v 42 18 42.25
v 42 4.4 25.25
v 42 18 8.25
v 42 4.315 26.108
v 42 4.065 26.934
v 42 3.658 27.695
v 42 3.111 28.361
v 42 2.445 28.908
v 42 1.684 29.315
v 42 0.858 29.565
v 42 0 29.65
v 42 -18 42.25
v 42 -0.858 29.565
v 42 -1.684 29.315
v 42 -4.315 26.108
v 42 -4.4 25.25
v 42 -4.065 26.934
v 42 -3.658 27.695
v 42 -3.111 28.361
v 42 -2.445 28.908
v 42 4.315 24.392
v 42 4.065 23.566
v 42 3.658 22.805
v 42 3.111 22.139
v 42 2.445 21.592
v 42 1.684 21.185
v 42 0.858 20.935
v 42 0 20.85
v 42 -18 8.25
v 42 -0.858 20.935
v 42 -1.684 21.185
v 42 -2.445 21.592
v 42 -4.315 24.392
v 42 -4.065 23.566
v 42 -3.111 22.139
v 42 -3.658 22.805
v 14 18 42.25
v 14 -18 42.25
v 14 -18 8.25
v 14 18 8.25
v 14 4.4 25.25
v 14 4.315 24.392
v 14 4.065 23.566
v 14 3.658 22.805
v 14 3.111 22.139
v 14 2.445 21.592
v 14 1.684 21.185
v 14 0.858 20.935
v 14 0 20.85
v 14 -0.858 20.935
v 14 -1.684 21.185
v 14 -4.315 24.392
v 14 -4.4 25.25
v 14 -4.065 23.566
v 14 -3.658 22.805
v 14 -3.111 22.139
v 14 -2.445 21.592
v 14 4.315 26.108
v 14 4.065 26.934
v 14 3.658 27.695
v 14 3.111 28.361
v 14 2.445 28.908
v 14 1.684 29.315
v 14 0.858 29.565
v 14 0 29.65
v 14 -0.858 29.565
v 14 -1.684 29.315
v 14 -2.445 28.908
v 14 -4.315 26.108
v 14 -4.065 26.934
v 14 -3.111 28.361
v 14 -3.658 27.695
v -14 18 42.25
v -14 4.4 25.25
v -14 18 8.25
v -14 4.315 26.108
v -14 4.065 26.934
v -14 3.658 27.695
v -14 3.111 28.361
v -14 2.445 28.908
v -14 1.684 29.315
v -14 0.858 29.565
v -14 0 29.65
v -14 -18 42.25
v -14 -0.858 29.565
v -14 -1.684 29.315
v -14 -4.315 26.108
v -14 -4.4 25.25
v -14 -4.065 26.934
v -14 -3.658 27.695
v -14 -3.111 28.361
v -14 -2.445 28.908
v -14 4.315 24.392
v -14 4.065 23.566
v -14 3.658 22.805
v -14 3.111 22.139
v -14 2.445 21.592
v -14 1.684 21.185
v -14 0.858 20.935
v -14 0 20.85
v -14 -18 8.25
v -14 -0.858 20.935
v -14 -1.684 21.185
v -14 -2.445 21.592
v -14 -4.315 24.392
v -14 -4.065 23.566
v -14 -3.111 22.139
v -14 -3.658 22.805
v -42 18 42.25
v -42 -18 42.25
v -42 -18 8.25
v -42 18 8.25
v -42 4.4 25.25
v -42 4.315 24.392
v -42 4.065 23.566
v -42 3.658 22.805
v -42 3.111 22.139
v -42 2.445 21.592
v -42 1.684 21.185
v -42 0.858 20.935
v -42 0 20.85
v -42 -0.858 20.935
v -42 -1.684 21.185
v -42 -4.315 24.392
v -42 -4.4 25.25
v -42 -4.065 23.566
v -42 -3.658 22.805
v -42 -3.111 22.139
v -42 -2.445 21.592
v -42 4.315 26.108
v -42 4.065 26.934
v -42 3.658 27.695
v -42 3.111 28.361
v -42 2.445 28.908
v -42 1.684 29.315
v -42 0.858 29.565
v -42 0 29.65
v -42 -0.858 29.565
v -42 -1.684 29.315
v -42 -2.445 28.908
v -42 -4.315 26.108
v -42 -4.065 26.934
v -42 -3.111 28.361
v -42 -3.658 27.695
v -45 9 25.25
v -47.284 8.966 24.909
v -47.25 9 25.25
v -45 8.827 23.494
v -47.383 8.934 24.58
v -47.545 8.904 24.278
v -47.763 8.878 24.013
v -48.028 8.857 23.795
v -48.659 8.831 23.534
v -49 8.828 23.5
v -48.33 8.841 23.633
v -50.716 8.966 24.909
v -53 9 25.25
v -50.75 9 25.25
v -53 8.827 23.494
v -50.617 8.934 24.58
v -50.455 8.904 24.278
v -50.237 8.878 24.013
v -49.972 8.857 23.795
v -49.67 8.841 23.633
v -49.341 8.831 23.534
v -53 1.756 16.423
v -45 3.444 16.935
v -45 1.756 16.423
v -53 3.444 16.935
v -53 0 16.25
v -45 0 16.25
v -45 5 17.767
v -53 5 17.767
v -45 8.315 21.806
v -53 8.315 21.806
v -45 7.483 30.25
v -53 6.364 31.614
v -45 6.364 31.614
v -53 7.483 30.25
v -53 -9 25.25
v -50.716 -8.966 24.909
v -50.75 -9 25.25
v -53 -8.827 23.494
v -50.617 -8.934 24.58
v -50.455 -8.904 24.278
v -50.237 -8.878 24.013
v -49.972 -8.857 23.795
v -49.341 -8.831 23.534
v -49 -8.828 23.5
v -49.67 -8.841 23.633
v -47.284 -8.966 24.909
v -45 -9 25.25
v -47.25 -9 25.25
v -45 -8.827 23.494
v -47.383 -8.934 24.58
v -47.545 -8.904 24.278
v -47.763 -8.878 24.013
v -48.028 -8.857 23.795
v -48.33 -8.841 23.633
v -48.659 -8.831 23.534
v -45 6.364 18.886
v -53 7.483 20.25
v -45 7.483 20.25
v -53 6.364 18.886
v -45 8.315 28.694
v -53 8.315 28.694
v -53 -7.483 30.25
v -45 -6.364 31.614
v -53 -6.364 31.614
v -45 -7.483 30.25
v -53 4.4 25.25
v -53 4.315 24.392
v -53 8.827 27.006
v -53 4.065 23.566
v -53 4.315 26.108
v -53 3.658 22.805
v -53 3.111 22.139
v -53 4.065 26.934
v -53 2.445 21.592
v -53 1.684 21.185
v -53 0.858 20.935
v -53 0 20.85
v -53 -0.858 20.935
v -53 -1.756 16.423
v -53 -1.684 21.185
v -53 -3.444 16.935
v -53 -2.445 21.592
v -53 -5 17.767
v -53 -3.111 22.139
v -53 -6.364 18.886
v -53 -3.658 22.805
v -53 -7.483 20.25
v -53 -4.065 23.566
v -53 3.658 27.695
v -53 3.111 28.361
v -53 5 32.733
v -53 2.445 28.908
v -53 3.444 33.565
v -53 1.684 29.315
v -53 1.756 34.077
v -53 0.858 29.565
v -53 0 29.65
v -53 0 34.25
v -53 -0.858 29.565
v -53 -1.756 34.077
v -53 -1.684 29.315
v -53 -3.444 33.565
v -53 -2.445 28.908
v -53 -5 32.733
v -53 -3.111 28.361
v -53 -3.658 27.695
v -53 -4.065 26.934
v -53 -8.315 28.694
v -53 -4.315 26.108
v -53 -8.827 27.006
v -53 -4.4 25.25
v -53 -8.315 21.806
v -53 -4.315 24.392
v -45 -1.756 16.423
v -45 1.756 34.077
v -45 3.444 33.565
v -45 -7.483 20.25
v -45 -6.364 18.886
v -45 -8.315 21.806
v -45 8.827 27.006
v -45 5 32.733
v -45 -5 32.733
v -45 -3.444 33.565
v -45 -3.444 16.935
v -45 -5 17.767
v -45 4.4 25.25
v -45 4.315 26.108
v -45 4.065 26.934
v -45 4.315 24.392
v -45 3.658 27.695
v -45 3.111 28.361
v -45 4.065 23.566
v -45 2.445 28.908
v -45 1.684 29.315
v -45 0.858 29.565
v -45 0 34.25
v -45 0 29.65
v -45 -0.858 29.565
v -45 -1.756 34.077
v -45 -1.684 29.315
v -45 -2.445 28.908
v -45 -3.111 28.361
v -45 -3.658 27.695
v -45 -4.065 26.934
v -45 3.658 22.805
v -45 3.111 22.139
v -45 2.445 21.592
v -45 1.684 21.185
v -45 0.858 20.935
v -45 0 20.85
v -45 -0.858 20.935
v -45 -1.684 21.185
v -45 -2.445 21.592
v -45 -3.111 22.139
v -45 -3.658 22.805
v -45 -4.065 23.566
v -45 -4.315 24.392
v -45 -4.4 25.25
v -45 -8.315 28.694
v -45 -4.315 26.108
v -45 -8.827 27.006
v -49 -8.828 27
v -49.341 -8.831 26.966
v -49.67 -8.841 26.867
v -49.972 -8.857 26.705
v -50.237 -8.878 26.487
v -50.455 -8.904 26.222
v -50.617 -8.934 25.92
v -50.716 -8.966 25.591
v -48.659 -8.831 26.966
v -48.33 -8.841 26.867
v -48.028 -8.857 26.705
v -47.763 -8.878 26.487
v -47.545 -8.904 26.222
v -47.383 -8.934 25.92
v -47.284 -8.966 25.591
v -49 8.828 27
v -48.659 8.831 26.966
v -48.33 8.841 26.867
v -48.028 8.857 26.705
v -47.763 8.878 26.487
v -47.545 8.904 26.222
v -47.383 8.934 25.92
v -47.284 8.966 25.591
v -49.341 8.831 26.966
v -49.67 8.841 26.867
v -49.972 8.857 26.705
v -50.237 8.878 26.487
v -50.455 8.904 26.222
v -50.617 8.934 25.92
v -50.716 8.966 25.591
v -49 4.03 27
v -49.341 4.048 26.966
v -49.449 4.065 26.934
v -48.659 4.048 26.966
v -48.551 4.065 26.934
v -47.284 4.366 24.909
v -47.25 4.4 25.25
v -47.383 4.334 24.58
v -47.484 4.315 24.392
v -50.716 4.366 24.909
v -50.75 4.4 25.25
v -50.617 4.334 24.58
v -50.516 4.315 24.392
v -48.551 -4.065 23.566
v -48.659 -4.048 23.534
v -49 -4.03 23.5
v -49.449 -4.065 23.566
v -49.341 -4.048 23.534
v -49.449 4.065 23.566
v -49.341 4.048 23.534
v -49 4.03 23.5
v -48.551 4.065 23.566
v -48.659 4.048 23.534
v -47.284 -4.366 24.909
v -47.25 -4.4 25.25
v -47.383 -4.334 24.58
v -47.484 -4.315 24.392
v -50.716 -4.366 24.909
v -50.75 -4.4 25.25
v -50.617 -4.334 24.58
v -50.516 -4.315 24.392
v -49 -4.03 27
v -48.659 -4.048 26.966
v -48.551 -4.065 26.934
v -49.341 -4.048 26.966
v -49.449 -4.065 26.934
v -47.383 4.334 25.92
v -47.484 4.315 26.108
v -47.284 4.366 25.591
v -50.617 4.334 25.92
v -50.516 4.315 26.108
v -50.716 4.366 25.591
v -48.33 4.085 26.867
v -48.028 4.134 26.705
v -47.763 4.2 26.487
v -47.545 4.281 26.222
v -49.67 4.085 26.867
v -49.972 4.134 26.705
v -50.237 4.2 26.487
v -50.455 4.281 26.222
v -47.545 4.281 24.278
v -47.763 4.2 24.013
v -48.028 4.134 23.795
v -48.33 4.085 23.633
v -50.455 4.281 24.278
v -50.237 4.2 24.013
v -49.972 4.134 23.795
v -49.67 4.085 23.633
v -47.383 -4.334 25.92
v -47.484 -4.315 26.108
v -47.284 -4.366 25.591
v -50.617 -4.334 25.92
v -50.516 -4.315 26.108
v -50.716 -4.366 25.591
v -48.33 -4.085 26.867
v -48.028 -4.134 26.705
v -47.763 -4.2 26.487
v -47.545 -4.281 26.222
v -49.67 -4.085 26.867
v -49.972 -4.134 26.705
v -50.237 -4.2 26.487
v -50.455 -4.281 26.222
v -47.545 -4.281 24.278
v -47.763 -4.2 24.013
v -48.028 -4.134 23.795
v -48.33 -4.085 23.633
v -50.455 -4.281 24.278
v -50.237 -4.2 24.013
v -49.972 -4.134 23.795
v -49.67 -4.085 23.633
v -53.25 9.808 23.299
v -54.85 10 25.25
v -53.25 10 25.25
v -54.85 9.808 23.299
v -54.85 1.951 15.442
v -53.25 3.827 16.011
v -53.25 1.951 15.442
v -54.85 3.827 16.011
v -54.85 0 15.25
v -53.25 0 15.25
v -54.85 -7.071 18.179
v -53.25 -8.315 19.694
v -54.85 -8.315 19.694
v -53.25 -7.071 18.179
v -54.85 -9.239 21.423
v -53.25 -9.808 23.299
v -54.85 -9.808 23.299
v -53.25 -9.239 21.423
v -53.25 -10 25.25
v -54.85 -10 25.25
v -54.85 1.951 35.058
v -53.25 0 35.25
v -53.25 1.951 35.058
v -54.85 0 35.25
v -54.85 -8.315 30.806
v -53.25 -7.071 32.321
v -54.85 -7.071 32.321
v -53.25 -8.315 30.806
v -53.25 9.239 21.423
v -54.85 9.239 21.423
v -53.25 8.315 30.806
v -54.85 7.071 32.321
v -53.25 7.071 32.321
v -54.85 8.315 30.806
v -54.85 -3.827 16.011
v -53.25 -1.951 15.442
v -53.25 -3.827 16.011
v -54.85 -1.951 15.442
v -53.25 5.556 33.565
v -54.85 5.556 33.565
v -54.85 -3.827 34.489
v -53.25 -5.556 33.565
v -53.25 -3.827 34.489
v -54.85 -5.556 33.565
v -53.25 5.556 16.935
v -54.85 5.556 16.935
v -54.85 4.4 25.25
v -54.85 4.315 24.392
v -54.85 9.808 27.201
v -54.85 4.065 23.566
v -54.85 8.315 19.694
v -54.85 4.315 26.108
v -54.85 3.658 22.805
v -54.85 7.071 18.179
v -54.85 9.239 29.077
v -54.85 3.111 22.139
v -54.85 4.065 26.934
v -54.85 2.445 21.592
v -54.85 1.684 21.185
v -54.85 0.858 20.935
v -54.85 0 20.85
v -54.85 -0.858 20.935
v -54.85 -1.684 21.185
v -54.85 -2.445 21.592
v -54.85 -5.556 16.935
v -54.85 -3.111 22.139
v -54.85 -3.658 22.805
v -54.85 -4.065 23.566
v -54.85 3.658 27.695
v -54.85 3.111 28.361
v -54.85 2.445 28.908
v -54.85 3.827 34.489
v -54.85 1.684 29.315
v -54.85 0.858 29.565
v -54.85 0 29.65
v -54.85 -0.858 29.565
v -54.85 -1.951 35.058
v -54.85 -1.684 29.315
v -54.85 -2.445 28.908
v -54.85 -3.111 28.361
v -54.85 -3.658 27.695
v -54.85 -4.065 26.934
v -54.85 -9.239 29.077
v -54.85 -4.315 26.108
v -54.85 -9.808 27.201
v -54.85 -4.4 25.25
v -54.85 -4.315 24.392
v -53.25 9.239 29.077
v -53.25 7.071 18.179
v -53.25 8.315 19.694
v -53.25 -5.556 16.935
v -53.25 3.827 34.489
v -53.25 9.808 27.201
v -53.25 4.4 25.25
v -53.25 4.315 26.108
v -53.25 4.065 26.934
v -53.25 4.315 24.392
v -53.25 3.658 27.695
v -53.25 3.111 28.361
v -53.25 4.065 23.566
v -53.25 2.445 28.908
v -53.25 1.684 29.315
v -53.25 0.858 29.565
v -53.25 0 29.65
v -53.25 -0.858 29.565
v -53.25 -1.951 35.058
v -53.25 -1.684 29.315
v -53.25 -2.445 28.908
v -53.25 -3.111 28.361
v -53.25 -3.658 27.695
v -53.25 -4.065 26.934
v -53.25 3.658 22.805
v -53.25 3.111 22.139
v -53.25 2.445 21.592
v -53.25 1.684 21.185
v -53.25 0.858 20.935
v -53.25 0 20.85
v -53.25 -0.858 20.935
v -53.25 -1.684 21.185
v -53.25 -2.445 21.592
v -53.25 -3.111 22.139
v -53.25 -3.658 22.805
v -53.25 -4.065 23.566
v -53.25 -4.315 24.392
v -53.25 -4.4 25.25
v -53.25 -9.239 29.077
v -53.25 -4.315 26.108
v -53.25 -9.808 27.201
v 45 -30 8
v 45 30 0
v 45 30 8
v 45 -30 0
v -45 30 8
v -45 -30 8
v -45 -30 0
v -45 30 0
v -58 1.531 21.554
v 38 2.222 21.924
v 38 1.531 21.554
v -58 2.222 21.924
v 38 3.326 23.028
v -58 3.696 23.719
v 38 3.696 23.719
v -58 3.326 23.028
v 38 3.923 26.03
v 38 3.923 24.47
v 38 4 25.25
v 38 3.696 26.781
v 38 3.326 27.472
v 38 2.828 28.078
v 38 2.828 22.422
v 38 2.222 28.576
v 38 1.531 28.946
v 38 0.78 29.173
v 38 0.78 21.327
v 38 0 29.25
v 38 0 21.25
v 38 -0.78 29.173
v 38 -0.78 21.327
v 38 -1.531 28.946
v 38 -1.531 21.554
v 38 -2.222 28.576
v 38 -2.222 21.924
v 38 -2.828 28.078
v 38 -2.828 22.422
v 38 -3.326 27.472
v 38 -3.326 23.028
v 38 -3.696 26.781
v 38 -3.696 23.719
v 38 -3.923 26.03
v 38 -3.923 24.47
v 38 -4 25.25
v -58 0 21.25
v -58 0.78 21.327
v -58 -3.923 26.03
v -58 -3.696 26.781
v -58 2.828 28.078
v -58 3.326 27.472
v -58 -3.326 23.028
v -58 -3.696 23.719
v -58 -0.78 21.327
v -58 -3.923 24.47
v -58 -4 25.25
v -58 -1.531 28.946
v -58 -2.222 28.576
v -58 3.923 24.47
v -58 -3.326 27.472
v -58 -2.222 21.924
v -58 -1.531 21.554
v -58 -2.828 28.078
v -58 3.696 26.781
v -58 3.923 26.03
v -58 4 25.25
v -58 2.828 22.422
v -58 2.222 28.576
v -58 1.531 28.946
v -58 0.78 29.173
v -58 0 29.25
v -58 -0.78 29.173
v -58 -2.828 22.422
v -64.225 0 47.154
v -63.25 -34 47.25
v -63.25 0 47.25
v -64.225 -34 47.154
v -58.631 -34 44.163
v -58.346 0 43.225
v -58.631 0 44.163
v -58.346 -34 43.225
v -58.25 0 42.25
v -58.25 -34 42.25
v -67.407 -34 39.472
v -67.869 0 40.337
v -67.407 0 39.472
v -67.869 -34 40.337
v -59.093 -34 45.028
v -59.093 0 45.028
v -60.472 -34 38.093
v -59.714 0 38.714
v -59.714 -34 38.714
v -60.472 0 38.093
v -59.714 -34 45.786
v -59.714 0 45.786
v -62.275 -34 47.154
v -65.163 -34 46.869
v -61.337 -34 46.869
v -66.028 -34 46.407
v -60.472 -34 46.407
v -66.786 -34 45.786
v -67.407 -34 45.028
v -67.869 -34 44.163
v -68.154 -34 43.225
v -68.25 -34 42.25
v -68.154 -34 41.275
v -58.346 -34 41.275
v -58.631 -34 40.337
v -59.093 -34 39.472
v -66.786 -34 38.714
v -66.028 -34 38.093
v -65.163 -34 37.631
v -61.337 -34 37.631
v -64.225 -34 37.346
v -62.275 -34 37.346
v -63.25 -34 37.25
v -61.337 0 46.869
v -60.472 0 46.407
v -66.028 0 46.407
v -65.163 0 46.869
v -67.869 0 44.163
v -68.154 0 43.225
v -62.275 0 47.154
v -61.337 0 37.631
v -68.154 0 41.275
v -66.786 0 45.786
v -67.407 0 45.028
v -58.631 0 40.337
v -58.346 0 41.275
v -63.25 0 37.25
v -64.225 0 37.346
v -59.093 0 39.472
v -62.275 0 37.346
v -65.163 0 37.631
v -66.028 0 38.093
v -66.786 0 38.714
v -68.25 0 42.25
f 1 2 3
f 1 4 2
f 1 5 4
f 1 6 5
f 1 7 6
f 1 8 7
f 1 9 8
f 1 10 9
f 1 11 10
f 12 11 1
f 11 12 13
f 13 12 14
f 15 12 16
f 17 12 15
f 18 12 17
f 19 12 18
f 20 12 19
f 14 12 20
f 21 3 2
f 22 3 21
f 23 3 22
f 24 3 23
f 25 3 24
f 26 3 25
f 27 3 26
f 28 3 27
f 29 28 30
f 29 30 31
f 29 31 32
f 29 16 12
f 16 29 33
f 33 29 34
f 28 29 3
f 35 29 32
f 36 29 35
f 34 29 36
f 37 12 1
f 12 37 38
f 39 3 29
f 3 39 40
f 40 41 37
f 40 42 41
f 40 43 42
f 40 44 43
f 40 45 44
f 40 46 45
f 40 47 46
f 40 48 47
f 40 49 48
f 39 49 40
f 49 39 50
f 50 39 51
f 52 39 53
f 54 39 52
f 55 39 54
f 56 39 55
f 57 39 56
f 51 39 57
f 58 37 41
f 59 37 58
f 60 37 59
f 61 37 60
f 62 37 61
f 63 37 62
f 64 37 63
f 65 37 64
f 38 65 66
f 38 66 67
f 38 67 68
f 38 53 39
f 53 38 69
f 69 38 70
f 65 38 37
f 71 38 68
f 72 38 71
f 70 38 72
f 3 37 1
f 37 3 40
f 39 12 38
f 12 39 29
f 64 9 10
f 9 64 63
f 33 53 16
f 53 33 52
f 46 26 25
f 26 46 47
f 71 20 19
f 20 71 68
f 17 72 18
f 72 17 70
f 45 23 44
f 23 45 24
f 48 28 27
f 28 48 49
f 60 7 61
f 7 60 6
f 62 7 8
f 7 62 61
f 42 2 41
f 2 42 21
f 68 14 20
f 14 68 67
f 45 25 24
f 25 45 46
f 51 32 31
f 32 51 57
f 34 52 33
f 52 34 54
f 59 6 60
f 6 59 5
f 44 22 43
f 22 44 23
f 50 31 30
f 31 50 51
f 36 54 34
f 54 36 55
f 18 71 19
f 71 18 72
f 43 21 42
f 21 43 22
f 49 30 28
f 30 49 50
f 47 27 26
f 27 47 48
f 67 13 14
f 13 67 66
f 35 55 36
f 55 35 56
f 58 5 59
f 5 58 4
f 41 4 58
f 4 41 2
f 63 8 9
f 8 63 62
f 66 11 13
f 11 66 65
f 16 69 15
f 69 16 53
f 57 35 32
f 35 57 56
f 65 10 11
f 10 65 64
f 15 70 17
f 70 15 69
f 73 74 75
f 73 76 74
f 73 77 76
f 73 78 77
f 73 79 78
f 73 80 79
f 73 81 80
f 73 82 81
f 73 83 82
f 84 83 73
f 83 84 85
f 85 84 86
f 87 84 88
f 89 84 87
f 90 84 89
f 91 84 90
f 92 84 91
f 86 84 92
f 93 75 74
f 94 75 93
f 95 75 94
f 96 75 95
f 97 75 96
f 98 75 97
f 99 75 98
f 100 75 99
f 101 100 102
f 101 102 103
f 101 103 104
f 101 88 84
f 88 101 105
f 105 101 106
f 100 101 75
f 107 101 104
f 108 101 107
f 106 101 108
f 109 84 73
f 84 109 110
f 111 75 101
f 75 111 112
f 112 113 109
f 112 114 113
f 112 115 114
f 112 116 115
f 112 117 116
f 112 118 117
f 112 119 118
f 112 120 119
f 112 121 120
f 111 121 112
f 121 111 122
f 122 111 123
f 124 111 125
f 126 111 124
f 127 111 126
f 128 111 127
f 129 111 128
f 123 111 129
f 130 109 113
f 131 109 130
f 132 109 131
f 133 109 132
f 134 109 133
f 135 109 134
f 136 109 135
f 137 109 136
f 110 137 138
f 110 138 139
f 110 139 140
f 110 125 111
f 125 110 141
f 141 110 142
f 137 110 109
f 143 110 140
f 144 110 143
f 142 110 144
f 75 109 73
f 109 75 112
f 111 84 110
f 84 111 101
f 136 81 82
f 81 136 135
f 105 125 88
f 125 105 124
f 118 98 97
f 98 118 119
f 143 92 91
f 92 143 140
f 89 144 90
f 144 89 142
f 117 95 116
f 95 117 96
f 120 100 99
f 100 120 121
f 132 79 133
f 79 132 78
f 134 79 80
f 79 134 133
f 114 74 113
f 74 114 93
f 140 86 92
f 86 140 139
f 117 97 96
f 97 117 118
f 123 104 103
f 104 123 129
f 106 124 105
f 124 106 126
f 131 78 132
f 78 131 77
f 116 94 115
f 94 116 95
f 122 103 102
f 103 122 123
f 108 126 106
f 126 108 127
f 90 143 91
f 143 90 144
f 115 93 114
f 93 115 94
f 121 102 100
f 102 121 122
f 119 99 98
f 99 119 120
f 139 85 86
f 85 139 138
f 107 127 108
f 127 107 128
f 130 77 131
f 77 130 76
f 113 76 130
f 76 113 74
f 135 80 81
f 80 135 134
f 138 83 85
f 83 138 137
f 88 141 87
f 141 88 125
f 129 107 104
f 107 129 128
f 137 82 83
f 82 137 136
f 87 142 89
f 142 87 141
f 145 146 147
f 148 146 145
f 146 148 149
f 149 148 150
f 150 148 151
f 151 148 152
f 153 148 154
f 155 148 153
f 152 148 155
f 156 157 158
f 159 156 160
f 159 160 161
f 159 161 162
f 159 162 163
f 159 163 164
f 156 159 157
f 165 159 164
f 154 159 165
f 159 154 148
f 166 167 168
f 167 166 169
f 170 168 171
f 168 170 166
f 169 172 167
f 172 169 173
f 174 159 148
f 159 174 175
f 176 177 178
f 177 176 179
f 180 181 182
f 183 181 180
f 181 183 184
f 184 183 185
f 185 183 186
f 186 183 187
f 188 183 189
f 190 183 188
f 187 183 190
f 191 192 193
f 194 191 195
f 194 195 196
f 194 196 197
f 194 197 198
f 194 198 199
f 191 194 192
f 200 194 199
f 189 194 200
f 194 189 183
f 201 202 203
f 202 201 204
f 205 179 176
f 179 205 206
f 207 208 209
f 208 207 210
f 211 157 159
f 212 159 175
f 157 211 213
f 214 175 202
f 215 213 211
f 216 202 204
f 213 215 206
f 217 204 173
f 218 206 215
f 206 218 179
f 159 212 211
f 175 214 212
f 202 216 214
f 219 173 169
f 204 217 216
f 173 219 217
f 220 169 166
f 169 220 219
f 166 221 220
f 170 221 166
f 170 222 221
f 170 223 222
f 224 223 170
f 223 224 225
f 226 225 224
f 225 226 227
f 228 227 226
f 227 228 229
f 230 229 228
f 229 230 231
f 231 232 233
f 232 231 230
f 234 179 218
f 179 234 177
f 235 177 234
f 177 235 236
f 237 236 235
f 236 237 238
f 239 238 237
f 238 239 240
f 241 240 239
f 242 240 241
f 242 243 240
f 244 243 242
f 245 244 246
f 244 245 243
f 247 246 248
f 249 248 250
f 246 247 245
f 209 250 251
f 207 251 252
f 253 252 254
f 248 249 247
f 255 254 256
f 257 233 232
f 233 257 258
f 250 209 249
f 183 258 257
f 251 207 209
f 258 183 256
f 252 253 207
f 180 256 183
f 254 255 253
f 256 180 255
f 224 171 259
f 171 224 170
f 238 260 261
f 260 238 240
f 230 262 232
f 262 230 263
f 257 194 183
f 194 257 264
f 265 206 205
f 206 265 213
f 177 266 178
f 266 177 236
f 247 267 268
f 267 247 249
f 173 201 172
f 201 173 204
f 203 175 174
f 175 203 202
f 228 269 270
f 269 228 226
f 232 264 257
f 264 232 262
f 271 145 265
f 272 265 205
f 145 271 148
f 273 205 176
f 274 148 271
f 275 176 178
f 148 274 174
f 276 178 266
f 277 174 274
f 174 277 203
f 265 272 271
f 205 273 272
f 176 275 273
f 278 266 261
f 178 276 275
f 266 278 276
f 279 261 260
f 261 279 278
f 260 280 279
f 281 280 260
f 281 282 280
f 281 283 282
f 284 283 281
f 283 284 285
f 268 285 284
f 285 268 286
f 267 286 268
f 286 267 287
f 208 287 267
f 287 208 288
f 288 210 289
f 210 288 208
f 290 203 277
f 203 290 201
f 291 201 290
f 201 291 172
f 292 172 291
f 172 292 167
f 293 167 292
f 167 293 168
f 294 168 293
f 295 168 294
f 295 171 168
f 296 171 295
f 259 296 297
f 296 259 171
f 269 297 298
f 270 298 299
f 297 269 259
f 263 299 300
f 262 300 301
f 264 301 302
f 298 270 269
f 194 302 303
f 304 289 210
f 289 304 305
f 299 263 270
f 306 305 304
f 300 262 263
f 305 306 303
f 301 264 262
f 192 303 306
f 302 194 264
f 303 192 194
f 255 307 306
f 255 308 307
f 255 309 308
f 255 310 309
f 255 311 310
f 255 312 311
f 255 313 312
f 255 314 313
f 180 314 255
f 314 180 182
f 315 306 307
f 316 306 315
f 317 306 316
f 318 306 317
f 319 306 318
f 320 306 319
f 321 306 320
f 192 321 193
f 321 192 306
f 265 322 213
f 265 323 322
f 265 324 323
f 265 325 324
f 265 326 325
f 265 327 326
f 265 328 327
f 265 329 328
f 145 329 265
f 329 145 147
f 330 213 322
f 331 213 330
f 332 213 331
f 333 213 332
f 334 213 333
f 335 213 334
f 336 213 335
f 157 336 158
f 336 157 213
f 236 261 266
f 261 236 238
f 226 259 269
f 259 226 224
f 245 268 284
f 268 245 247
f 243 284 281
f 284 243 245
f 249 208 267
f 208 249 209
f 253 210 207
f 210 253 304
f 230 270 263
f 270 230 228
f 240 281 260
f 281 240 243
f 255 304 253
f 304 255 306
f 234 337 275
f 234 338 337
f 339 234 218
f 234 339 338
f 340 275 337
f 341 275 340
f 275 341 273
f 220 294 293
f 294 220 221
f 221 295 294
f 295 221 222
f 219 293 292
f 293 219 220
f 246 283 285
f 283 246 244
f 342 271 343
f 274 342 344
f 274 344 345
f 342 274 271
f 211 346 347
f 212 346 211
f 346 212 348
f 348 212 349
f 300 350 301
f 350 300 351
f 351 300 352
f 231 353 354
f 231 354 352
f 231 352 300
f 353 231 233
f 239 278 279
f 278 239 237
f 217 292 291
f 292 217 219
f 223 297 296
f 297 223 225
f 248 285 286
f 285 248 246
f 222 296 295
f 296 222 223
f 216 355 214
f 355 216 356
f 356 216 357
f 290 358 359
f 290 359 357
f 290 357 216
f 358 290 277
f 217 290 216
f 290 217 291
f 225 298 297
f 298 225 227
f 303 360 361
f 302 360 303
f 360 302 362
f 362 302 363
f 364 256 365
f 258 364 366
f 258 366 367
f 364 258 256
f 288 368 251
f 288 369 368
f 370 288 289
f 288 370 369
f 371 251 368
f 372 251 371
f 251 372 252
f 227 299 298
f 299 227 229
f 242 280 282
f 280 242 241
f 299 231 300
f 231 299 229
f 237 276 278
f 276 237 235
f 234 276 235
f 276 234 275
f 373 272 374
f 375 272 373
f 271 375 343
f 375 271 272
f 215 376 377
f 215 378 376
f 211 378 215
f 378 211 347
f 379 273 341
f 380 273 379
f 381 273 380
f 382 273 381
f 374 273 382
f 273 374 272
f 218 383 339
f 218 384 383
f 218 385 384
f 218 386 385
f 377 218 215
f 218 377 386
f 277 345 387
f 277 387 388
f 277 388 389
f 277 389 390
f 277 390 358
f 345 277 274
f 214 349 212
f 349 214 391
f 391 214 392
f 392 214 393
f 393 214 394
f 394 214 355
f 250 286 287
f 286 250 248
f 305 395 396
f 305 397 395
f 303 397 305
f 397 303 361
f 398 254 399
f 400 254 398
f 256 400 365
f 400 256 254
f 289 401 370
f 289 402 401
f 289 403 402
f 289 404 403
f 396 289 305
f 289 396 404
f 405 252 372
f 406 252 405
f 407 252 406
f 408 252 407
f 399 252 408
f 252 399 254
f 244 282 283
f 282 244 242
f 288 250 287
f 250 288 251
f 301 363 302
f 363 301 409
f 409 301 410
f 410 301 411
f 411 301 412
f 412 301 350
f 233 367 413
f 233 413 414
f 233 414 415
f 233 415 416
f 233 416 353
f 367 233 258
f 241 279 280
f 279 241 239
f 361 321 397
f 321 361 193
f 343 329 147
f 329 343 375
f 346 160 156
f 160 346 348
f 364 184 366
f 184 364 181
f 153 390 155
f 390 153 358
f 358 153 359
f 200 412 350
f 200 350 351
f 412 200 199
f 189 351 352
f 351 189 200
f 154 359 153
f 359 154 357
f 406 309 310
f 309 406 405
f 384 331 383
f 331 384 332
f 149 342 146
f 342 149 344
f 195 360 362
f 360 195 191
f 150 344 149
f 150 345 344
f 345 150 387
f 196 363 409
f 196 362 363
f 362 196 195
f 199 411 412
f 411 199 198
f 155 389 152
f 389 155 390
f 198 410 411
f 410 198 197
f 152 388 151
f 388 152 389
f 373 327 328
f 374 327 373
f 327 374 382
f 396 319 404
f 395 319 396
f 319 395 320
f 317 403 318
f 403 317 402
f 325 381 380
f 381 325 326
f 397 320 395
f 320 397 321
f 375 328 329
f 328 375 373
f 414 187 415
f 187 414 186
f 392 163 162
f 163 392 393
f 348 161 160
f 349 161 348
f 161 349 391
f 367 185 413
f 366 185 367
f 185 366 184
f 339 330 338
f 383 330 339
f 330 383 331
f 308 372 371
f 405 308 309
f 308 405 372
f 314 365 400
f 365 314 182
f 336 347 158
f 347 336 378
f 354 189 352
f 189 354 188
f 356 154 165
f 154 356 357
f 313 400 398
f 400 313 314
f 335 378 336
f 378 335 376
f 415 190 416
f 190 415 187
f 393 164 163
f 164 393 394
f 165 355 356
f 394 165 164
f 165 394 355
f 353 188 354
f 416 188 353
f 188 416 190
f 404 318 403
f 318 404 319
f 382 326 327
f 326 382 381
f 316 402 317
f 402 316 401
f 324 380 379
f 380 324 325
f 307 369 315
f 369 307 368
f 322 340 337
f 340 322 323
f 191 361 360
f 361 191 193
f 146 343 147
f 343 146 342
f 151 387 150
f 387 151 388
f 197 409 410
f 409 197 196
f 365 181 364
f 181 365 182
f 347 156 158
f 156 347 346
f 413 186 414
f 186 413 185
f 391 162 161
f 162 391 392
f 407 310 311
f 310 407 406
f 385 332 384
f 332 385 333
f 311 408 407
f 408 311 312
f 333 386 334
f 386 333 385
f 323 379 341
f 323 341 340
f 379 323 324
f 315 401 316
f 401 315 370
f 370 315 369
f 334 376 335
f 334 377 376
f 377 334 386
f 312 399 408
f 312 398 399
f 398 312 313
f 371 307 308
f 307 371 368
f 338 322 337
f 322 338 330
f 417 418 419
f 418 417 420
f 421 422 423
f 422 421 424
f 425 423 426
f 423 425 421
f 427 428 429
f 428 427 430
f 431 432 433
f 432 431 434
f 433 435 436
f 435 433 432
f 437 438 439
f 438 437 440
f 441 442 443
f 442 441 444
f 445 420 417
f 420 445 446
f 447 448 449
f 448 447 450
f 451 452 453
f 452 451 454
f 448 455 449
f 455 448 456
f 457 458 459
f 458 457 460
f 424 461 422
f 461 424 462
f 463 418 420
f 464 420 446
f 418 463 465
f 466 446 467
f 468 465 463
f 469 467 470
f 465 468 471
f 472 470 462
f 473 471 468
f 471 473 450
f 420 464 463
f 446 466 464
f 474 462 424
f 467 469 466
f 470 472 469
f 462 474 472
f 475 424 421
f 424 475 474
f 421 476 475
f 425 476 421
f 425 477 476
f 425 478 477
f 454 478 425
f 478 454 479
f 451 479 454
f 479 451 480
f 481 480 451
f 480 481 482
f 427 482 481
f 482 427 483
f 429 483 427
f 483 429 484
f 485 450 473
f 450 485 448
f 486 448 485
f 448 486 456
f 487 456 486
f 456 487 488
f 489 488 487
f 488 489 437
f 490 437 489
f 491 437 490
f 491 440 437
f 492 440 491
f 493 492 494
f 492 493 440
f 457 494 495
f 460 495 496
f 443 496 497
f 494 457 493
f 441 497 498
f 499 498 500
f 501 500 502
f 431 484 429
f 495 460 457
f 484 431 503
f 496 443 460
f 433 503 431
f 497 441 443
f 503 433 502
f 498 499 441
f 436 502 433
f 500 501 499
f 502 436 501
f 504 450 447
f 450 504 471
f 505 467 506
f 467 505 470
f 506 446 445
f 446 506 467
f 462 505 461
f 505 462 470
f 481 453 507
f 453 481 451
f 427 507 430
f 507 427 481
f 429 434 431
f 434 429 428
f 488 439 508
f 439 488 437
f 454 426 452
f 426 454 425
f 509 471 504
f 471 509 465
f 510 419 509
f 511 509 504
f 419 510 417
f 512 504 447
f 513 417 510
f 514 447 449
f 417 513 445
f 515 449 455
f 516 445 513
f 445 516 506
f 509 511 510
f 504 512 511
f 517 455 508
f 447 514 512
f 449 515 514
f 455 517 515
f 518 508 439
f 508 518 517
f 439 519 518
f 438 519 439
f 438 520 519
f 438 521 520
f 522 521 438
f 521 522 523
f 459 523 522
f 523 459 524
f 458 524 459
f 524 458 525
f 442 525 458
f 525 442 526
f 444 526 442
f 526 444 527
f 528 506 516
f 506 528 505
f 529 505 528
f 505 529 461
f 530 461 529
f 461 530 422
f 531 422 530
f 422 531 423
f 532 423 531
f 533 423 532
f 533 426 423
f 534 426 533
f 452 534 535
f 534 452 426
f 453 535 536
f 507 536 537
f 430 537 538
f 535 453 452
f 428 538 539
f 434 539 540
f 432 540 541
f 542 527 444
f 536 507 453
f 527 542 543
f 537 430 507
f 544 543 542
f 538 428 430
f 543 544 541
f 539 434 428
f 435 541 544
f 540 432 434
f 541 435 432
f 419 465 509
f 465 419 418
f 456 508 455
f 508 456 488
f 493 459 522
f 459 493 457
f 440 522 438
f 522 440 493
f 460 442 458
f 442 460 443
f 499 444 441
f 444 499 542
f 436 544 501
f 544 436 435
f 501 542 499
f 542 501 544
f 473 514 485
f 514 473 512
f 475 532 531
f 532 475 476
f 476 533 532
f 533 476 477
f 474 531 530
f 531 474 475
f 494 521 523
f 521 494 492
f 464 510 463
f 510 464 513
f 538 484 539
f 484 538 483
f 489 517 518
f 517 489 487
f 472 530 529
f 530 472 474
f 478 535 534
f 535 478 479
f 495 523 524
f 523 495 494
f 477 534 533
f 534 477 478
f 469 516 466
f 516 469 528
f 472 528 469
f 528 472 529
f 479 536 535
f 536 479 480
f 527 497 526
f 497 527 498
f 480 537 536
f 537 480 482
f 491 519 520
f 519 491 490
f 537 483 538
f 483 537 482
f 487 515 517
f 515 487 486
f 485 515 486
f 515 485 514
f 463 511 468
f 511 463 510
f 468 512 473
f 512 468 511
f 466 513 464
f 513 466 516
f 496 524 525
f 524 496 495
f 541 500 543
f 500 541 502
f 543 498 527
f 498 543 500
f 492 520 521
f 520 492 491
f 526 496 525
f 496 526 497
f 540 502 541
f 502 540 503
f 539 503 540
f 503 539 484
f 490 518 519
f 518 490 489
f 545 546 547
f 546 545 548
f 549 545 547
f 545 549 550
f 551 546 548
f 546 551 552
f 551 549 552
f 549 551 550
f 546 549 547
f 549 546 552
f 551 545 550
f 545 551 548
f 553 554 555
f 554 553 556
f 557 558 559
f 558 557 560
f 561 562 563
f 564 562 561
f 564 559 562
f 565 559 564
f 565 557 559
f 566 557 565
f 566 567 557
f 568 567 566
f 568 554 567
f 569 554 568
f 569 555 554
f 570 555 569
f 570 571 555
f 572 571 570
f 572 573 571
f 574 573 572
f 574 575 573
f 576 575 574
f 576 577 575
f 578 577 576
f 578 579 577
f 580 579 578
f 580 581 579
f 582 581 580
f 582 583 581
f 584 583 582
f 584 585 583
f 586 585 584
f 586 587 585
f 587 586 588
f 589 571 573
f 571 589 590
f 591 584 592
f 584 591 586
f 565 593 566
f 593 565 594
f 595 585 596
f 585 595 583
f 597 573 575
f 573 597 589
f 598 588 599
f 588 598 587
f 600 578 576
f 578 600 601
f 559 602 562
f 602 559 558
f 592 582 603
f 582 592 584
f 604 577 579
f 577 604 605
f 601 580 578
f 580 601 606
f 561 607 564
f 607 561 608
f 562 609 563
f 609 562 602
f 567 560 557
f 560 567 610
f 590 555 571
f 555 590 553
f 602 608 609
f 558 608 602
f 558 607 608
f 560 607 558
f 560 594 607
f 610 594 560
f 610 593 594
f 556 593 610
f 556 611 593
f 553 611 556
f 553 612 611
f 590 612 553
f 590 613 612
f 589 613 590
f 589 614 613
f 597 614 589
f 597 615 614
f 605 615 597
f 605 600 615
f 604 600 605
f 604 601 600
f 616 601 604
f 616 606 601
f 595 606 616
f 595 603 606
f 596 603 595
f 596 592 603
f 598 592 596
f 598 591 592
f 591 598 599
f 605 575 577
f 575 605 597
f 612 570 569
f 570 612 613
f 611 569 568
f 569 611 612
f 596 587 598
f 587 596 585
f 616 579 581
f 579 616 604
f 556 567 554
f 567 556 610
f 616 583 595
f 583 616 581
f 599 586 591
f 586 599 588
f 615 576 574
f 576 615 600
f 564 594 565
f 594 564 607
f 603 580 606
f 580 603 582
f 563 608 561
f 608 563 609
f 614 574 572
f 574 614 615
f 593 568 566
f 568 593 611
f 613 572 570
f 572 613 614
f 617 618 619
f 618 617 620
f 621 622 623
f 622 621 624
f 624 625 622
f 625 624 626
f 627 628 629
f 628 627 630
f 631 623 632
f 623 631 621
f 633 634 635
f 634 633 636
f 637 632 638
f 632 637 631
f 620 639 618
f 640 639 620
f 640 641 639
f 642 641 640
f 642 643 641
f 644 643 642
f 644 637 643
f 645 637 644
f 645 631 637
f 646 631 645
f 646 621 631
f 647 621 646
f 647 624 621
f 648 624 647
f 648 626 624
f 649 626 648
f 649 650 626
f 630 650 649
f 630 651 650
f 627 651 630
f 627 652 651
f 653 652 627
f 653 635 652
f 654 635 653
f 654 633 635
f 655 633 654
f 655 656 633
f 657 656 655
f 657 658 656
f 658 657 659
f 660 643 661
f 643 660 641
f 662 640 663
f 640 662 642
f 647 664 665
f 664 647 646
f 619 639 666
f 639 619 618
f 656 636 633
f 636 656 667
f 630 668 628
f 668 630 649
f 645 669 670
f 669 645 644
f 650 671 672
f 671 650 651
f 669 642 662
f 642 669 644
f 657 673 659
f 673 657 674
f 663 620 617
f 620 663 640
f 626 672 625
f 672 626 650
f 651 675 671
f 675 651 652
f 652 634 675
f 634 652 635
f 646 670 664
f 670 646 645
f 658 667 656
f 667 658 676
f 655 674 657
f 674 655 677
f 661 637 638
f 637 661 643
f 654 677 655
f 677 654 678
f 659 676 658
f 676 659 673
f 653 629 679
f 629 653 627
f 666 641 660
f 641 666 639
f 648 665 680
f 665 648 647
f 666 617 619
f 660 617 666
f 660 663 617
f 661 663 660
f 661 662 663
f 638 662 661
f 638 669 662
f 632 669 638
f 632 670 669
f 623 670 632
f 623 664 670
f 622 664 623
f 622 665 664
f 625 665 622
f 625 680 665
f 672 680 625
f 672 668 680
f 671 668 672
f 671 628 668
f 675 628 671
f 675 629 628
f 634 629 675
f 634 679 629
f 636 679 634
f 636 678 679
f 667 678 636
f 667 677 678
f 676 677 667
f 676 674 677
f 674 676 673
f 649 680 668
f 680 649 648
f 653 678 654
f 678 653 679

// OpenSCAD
$fn = 32;

// ------------------------------------------------------------------------
// Machine vise: screw d8, jaws 28 x 34 mm
// Every part is its own module, assembly() places every instance.
// ------------------------------------------------------------------------

// --- part 1 ---
module vise_bed() {
  difference() {
    translate([-45, -30, 0]) cube([90, 60, 8]);
  }
}

// --- part 2 ---
module vise_jaw() {
  difference() {
    translate([-14, -18, 0]) cube([28, 36, 34]);
    translate([0, 0, 17]) rotate([0, 90, 0]) cylinder(h = 30, d = 8.8, center = true);
  }
}

// --- part 3 ---
module vise_screw() {
  translate([0, 0, -48]) cylinder(h = 96, d = 8);
}

// --- part 4 ---
module screw_collar() {
  difference() {
    cylinder(h = 8, d = 18);
    translate([0, 0, -1]) cylinder(h = 10, d = 8.8);
    translate([0, 0, 4]) rotate([90, 0, 0]) cylinder(h = 20, d = 3.5, center = true);
  }
}

// --- part 5 ---
module screw_washer() {
  difference() {
      translate([0, 0, 0]) cylinder(h = 1.6, d = 20);
      translate([0, 0, -1]) cylinder(h = 3.6, d = 8.8);
    }
}

// --- part 6 ---
module vise_handle() {
  cylinder(h = 34, d = 10);
}

// --- assembly ---
module assembly() {
  color([0.80, 0.24, 0.20]) translate([0, 0, 0]) rotate([0, 0, 0]) vise_bed();
  color([0.20, 0.45, 0.75]) translate([28, 0, 8.25]) rotate([0, 0, 0]) vise_jaw();
  color([0.25, 0.62, 0.32]) translate([-28, 0, 8.25]) rotate([0, 0, 0]) vise_jaw();
  color([0.92, 0.70, 0.18]) translate([-10, 0, 25.25]) rotate([0, 90, 0]) vise_screw();
  color([0.58, 0.35, 0.70]) translate([-53, 0, 25.25]) rotate([0, 90, 0]) screw_collar();
  color([0.16, 0.66, 0.66]) translate([-54.85, 0, 25.25]) rotate([0, 90, 0]) screw_washer();
  color([0.85, 0.48, 0.18]) translate([-63.25, 0, 42.25]) rotate([90, 0, 0]) vise_handle();
}

assembly();
